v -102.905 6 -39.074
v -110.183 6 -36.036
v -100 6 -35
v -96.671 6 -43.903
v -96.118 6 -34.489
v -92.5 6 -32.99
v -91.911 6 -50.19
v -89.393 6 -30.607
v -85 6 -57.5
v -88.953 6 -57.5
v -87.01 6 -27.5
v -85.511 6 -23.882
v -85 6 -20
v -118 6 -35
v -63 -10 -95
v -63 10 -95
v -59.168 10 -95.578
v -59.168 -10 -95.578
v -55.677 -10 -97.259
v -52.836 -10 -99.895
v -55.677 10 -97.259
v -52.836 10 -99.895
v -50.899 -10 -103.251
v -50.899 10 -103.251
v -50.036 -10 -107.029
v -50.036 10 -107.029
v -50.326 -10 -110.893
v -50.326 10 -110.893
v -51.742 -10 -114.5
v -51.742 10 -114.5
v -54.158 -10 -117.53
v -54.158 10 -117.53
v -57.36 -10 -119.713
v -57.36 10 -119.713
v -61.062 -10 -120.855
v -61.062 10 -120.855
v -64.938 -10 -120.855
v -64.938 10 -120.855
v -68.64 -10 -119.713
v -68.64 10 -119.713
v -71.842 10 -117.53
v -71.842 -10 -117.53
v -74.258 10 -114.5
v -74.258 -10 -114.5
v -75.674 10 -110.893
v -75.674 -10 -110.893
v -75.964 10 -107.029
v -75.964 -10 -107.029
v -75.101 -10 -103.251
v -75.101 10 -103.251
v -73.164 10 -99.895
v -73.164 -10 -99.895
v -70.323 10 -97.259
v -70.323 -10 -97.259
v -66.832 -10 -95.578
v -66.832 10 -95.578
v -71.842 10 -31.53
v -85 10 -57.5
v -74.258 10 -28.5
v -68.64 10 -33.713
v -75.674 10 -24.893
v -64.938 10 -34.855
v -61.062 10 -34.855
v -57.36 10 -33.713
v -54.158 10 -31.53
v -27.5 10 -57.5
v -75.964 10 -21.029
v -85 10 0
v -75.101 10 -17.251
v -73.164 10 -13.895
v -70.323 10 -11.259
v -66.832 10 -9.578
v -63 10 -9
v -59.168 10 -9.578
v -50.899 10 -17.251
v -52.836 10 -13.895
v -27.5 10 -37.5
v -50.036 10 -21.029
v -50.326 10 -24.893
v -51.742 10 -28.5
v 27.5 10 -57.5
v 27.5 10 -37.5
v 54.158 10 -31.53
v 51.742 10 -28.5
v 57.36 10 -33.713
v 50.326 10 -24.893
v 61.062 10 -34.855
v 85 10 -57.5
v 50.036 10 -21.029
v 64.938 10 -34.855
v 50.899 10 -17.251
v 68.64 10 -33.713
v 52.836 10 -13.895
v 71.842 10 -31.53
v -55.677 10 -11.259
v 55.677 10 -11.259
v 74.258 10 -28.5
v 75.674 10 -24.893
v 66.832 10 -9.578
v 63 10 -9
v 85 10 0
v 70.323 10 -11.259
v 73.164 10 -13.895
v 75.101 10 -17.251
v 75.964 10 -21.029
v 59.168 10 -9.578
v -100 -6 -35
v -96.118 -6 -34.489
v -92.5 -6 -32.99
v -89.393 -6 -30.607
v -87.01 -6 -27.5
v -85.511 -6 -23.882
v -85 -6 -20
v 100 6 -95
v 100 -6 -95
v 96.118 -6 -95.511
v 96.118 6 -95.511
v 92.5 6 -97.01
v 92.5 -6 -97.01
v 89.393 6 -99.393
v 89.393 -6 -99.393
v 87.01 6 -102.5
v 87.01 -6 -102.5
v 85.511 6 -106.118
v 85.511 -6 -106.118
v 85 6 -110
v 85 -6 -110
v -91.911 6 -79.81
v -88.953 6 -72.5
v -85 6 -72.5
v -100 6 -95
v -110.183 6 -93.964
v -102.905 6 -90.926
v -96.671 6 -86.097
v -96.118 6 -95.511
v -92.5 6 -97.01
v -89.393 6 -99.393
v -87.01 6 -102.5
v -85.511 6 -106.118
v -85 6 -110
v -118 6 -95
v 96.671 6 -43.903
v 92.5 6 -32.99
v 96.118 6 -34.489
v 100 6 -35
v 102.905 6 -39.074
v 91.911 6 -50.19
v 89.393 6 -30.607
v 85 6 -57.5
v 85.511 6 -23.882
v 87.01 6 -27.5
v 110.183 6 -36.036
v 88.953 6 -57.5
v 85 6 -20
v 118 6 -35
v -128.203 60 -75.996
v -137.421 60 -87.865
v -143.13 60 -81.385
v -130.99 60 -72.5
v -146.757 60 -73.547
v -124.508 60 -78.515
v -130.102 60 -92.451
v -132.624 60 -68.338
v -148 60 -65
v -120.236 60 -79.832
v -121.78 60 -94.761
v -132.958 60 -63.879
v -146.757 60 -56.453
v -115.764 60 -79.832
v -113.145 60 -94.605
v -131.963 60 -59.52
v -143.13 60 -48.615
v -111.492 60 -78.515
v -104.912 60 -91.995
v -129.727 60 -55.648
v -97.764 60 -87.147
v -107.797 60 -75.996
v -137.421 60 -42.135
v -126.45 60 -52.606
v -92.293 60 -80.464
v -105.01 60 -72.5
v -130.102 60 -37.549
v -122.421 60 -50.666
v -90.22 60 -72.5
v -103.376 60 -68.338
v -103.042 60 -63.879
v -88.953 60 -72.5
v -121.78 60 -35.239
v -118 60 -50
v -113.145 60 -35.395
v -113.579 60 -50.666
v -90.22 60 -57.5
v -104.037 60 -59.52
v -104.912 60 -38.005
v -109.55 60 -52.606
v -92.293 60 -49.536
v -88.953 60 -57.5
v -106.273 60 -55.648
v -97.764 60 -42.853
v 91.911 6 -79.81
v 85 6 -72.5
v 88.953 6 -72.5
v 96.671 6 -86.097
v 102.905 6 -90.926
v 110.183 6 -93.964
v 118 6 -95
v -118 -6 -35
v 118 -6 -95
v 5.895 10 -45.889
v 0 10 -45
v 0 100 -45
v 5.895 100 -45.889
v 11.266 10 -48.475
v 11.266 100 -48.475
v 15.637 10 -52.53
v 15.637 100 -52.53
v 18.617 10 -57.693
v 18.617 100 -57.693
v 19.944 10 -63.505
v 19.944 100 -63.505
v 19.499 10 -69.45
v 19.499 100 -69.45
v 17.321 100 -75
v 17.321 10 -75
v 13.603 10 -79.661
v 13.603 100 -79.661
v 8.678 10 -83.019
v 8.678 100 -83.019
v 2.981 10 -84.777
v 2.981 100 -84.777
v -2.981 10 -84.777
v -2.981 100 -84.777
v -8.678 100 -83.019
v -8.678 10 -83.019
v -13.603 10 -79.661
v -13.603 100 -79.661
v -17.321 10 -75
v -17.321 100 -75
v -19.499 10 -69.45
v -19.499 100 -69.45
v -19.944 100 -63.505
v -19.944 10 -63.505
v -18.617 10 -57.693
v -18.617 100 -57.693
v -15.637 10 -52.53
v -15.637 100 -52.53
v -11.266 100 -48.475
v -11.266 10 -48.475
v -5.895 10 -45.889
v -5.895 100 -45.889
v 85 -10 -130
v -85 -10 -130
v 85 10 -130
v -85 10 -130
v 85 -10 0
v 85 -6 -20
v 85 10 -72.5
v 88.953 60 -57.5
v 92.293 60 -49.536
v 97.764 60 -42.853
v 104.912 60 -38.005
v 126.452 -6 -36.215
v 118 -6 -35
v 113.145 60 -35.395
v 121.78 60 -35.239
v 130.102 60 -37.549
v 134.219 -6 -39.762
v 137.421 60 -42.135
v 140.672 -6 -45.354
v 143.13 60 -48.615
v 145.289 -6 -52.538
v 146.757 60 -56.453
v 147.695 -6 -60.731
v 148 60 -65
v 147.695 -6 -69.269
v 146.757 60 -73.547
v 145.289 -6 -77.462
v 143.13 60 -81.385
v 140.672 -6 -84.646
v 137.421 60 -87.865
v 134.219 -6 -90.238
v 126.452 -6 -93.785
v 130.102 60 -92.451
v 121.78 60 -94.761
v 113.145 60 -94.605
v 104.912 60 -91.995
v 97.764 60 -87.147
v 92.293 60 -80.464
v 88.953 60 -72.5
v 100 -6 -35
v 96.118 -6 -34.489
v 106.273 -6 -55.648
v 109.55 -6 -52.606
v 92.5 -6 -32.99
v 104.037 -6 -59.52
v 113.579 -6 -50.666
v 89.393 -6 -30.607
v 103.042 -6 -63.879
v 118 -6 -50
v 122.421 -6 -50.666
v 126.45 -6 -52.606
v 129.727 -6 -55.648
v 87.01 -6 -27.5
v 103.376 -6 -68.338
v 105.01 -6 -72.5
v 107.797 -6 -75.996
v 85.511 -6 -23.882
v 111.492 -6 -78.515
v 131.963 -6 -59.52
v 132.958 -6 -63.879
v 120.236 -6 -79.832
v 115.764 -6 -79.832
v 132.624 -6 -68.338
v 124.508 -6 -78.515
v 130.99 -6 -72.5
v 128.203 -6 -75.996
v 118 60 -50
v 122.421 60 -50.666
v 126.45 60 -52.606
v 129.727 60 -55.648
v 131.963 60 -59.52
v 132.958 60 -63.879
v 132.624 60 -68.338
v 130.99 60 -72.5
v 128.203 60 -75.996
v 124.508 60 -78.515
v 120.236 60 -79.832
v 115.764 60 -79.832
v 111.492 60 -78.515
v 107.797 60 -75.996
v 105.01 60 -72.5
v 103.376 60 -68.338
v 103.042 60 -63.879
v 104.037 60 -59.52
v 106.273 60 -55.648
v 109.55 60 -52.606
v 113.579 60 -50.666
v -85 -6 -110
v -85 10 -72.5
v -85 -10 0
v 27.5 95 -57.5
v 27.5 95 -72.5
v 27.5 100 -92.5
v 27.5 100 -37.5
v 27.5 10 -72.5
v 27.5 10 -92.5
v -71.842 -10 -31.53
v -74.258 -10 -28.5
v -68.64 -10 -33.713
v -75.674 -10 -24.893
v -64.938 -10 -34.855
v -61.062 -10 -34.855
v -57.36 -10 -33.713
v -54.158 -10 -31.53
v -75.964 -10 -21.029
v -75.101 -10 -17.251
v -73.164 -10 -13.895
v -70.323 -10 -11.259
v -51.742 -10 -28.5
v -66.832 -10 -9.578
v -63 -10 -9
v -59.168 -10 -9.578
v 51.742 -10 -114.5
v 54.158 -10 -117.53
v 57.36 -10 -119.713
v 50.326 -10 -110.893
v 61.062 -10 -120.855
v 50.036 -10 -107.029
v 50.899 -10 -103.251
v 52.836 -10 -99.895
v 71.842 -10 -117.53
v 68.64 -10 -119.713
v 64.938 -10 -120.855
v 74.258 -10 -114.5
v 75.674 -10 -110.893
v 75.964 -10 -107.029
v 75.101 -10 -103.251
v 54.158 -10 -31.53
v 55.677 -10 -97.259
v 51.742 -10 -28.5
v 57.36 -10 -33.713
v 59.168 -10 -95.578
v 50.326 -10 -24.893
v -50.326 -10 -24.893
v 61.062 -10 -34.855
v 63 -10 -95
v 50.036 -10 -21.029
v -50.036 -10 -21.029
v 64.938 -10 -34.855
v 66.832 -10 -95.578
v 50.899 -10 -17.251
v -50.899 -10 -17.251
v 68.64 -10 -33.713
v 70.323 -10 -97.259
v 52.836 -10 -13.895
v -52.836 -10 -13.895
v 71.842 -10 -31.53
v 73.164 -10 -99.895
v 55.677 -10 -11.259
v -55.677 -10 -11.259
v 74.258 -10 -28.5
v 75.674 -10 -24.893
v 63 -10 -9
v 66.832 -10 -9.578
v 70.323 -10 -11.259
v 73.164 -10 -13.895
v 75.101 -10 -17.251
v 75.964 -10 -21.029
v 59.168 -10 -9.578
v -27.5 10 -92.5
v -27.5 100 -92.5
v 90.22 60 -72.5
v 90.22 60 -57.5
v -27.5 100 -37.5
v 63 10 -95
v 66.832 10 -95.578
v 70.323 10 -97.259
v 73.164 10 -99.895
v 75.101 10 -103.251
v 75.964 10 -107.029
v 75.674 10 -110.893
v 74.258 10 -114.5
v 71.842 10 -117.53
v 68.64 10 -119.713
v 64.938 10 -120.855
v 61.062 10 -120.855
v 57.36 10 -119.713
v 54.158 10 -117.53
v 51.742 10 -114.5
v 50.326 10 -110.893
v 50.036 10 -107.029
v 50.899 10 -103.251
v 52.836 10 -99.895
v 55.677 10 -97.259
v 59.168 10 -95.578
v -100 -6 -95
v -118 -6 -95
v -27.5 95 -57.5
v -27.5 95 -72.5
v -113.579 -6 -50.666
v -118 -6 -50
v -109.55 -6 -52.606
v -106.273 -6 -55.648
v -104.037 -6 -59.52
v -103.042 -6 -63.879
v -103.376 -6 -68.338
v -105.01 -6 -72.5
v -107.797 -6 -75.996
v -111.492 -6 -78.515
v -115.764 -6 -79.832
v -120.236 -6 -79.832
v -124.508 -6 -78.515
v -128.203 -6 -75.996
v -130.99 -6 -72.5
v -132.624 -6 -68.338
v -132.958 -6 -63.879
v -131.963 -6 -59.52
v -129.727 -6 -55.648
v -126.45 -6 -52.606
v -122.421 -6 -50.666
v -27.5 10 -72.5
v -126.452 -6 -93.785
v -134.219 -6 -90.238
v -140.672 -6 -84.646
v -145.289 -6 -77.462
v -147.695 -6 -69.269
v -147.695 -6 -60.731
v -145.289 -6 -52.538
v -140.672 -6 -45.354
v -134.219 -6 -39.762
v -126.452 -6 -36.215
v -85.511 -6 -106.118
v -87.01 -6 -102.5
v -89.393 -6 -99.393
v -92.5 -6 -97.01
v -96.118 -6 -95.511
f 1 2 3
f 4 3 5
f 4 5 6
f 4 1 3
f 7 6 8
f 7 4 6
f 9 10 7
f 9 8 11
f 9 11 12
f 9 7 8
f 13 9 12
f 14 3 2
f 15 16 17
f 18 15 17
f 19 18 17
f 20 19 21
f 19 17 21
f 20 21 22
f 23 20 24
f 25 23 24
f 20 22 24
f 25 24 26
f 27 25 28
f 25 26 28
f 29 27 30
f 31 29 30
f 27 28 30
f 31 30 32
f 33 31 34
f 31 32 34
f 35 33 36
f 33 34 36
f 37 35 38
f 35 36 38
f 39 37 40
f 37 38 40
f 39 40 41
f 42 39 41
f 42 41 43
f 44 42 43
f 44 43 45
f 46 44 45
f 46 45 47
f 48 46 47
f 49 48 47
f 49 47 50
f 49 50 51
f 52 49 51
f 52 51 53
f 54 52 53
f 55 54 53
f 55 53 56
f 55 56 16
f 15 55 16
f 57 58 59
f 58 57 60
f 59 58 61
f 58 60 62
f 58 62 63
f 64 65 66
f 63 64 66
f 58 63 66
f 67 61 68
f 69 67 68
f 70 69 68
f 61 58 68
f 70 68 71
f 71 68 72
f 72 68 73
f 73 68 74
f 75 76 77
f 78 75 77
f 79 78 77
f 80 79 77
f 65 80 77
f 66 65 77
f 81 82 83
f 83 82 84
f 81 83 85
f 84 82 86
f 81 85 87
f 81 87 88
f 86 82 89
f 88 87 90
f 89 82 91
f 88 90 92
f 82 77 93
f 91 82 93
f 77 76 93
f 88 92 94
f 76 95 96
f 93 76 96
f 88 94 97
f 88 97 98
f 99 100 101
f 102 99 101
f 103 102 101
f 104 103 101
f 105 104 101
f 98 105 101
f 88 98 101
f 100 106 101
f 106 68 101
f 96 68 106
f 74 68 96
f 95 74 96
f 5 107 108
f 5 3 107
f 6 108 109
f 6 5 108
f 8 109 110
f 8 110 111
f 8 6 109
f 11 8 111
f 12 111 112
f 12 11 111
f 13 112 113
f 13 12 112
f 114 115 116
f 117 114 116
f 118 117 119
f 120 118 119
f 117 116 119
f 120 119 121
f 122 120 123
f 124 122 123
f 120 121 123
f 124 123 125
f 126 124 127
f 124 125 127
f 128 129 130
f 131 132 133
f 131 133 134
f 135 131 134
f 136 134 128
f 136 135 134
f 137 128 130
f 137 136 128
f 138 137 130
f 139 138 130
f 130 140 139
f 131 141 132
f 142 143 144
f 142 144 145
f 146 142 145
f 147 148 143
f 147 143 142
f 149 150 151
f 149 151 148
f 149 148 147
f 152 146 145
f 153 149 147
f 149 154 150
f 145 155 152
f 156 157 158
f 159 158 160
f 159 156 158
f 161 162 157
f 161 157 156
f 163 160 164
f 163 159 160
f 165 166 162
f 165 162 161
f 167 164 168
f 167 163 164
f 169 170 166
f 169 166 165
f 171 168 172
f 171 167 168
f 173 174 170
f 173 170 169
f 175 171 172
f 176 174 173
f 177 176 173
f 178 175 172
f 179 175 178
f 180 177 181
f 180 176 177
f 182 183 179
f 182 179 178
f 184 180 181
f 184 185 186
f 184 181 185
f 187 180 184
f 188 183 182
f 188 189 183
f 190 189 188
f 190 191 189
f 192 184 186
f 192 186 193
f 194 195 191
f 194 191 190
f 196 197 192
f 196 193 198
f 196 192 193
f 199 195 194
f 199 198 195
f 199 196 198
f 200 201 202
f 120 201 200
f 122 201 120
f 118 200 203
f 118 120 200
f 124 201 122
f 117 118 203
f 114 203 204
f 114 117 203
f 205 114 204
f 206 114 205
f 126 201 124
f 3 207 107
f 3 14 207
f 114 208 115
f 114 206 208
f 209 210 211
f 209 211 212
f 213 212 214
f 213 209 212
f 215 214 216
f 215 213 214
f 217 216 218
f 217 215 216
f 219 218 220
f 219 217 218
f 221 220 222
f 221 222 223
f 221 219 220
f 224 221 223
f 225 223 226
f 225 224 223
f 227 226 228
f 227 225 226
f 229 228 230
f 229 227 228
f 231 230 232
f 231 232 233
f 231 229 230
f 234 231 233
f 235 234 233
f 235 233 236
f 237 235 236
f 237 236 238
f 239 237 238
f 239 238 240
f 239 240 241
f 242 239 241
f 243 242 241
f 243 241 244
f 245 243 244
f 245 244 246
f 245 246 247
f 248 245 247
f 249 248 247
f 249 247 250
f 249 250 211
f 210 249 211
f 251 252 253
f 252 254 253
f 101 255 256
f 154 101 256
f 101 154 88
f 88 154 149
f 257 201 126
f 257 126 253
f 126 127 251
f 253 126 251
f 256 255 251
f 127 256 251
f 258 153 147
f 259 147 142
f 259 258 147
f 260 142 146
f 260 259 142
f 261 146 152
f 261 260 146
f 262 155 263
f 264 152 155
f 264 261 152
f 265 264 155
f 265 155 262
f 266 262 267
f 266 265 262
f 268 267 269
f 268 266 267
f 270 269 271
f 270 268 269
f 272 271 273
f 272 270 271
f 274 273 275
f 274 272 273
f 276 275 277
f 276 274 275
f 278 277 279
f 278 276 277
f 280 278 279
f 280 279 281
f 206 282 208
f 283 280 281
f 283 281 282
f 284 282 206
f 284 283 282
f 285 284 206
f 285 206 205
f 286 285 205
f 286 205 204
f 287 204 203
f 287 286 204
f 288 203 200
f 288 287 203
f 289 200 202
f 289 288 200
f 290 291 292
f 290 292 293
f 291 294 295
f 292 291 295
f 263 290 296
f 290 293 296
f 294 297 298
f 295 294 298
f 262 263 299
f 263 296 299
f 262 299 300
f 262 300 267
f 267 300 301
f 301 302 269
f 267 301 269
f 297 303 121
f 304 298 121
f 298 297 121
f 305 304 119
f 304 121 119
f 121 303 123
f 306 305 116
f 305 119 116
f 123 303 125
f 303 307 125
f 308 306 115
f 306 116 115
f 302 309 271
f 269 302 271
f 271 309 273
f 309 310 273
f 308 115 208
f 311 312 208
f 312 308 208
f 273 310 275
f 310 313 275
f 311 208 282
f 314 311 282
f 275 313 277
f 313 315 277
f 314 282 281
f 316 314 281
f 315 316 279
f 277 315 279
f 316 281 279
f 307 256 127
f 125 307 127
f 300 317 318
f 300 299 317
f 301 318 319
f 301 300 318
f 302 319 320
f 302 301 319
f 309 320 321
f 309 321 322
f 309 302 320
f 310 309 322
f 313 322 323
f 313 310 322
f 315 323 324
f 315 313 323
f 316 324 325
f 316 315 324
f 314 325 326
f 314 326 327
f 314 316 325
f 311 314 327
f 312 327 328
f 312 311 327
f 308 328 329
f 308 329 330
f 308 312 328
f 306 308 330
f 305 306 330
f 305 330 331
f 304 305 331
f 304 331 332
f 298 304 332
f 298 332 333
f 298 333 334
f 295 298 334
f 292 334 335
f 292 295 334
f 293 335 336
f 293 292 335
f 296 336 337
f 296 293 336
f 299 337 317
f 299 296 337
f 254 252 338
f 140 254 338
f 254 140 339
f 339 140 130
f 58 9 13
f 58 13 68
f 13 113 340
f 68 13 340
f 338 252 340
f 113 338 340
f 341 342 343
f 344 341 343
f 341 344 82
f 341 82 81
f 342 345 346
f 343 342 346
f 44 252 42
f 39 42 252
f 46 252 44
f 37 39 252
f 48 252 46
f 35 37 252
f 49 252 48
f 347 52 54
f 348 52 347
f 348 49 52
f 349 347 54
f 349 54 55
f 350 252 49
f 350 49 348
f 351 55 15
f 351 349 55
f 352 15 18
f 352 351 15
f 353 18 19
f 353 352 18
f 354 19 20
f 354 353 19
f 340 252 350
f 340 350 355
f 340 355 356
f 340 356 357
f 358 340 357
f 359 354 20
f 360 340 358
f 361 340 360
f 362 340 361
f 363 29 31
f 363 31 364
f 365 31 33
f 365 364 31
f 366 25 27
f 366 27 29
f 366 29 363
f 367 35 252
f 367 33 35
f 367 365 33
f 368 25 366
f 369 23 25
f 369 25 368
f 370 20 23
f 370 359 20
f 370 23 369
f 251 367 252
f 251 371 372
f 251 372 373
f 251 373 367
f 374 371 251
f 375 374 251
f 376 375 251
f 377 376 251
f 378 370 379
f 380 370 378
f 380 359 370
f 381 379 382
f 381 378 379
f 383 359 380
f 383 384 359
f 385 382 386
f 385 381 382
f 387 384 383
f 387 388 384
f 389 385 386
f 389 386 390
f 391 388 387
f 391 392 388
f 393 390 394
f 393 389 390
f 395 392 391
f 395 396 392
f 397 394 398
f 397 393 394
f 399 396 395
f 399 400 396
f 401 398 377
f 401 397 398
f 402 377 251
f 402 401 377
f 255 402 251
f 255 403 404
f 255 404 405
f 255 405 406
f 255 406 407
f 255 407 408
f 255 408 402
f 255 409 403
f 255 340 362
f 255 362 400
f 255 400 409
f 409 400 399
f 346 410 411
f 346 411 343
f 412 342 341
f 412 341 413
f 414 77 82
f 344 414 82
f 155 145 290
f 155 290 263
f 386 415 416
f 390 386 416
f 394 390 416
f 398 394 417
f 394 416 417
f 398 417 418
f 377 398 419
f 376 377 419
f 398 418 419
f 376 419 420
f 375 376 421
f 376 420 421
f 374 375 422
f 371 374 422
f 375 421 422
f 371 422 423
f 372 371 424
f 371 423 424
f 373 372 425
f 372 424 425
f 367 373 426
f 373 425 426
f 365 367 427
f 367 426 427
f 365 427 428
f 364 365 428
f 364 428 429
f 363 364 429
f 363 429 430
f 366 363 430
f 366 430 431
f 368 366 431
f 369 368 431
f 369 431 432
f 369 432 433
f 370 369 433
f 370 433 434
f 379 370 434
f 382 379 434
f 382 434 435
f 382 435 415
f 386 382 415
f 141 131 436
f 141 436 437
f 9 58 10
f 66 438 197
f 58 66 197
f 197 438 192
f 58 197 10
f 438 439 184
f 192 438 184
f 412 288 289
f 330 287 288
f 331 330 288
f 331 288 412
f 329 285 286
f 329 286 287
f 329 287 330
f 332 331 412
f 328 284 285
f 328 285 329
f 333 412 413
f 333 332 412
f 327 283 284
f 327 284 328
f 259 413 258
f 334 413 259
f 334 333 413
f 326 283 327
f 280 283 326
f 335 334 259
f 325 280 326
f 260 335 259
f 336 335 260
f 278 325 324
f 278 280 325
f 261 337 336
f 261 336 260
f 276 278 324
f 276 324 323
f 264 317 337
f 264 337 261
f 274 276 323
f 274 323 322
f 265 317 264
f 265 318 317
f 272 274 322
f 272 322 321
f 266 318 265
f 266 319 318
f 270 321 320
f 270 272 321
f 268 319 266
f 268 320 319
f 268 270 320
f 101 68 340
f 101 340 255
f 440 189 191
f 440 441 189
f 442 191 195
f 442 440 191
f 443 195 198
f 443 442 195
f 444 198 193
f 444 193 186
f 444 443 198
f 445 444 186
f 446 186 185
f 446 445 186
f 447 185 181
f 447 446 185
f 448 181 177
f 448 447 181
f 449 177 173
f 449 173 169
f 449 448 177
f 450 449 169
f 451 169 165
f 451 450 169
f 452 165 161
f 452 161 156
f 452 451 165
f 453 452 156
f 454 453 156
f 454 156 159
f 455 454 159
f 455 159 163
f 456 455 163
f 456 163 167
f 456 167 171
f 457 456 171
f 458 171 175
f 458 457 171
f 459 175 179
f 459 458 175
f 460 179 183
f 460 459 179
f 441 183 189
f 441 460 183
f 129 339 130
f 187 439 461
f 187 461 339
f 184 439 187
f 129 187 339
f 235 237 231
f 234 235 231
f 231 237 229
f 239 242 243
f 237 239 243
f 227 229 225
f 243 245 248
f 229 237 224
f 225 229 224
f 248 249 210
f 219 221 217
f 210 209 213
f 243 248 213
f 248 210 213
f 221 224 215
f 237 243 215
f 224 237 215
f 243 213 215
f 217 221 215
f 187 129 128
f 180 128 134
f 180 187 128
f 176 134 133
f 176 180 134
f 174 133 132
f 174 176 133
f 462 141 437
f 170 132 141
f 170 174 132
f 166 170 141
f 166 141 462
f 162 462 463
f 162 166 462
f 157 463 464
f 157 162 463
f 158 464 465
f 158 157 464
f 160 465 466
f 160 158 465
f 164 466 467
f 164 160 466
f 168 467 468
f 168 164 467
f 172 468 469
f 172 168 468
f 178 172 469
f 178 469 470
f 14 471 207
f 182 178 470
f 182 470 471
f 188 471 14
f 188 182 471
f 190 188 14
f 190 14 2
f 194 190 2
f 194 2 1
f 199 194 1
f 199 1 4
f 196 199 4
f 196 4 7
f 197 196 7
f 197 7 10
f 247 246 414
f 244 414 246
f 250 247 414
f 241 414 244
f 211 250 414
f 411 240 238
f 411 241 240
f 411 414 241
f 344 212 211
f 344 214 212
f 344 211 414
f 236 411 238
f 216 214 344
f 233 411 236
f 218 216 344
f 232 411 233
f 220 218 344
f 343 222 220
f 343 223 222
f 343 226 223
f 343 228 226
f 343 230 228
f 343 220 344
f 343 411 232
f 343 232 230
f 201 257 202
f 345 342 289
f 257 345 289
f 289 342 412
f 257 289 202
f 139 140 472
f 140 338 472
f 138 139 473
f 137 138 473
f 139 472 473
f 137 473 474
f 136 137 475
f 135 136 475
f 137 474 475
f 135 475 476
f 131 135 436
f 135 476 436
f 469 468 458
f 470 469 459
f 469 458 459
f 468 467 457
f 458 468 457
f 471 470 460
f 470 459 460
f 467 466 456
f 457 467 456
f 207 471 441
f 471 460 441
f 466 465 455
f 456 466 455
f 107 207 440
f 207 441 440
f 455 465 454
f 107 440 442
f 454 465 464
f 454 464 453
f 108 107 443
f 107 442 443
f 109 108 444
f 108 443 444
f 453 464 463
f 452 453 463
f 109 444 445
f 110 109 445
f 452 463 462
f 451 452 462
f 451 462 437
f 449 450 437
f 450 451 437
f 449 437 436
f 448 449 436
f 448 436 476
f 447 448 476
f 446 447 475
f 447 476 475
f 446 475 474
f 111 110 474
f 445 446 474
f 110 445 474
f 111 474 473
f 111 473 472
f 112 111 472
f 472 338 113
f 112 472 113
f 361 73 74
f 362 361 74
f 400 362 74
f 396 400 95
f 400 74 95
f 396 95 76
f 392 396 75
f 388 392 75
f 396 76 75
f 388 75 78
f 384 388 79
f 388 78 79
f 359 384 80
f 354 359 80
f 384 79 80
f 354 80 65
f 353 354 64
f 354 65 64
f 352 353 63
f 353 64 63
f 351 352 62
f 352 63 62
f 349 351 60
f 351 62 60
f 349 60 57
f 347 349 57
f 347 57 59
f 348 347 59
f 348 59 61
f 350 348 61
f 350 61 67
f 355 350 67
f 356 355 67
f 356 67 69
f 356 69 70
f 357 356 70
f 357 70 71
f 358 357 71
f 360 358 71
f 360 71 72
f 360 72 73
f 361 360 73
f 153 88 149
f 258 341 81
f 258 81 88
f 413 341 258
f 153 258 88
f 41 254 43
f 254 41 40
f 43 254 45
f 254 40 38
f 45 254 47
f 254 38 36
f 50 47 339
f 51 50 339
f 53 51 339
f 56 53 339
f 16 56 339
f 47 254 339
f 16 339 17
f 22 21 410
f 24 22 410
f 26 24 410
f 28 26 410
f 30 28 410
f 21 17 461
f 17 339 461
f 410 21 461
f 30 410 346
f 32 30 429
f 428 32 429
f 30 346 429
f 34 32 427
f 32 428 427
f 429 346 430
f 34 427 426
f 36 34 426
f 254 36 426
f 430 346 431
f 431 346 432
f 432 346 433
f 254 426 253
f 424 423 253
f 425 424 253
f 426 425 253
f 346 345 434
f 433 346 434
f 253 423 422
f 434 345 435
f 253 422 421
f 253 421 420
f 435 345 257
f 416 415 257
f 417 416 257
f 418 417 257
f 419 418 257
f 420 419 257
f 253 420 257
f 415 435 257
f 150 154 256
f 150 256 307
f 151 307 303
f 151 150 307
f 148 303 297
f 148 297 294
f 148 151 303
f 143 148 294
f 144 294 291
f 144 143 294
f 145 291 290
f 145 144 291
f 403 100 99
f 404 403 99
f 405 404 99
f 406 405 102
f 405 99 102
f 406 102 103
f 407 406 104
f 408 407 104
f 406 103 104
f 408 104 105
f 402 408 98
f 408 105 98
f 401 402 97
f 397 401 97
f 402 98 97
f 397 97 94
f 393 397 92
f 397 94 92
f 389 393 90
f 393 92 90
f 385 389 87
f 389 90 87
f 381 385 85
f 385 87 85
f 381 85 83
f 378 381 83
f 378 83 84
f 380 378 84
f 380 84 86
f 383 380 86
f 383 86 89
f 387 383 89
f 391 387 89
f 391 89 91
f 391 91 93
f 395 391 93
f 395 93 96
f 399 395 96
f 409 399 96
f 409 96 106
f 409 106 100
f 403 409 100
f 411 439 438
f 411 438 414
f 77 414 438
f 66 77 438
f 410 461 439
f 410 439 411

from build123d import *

# Parameters (mm, degrees)
SKETCH1_W                  = 170
SKETCH1_H                  = 20
BOSS_EXTRUDE1_DEPTH        = 130
BOSS_EXTRUDE3_DEPTH        = 60
BOSS_EXTRUDE3_DEPTH_BACK   = 6
SKETCH2_R                  = 30
SKETCH2_R_2                = 15
BOSS_EXTRUDE3_2_DEPTH      = 60
BOSS_EXTRUDE3_2_DEPTH_BACK = 6
BOSS_EXTRUDE4_DEPTH        = 6
BOSS_EXTRUDE4_DEPTH_BACK   = 6
SKETCH2_4_W                = 55
SKETCH2_4_H                = 55
SKETCH2_5_W                = 55
SKETCH2_5_H                = 55
SKETCH2_5_R                = 20
BOSS_EXTRUDE5_DEPTH        = 100
RIB10_REACH                = 192.076
SKETCH3_WALL_W             = 453.9773952
SKETCH3_WALL_H             = 15
SKETCH4_R                  = 13
CUT_EXTRUDE1_DEPTH         = 217.573313222


with BuildPart() as part:
    # Sketch1 → Boss-Extrude1 (new body)
    with BuildSketch(Plane.XY):
        Rectangle(SKETCH1_W, SKETCH1_H)
    extrude(amount=-BOSS_EXTRUDE1_DEPTH)



with BuildPart() as body_2:
    # Sketch2 → Boss-Extrude3 (new, two sides: drawn at the far end of the back side and taken through both)
    with BuildSketch(Plane(origin=(0, 0, 0), x_dir=(1, 0, 0), z_dir=(0, 1, 0)).offset(-BOSS_EXTRUDE3_DEPTH_BACK)):
        with Locations((-118, 65)):
            Circle(SKETCH2_R)
        with Locations((-118, 65)):
            Circle(SKETCH2_R_2, mode=Mode.SUBTRACT)
    extrude(amount=BOSS_EXTRUDE3_DEPTH + BOSS_EXTRUDE3_DEPTH_BACK)


with BuildPart() as body_3:
    # Sketch2 → Boss-Extrude3 2 (new, two sides: drawn at the far end of the back side and taken through both)
    with BuildSketch(Plane(origin=(0, 0, 0), x_dir=(1, 0, 0), z_dir=(0, 1, 0)).offset(-BOSS_EXTRUDE3_2_DEPTH_BACK)):
        with Locations((118, 65)):
            Circle(SKETCH2_R)
        with Locations((118, 65)):
            Circle(SKETCH2_R_2, mode=Mode.SUBTRACT)
    extrude(amount=BOSS_EXTRUDE3_2_DEPTH + BOSS_EXTRUDE3_2_DEPTH_BACK)


with BuildPart() as part_1:
    add(part.part)

    add(body_2.part)  # Boss-Extrude4 merges body 2

    add(body_3.part)  # Boss-Extrude4 merges body 3
    # Sketch2<4> → Boss-Extrude4 (add, two sides: drawn at the far end of the back side and taken through both)
    with BuildSketch(Plane(origin=(0, 0, 0), x_dir=(1, 0, 0), z_dir=(0, 1, 0)).offset(-BOSS_EXTRUDE4_DEPTH_BACK)):
        with BuildLine():
            Line((85, 130), (-85, 130))
            Line((-85, 130), (-85, 110))
            ThreePointArc((-85, 110), (-89.393398282, 99.393398282), (-100, 95))
            Line((-100, 95), (-118, 95))
            ThreePointArc((-118, 95), (-96.786796564, 86.213203436), (-88, 65))
            ThreePointArc((-88, 65), (-96.786796564, 43.786796564), (-118, 35))
            Line((-118, 35), (-100, 35))
            ThreePointArc((-100, 35), (-89.393398282, 30.606601718), (-85, 20))
            Line((-85, 20), (-85, 0))
            Line((-85, 0), (85, 0))
            Line((85, 0), (85, 20))
            ThreePointArc((85, 20), (89.393398282, 30.606601718), (100, 35))
            Line((100, 35), (118, 35))
            ThreePointArc((118, 35), (88, 65), (118, 95))
            Line((118, 95), (100, 95))
            ThreePointArc((100, 95), (89.393398282, 99.393398282), (85, 110))
            Line((85, 110), (85, 130))
        make_face()
        with Locations((0, 65)):
            Rectangle(SKETCH2_4_W, SKETCH2_4_H, mode=Mode.SUBTRACT)
    extrude(amount=BOSS_EXTRUDE4_DEPTH + BOSS_EXTRUDE4_DEPTH_BACK)

    # Sketch2<5> → Boss-Extrude5 (add)
    with BuildSketch(Plane(origin=(0, 0, 0), x_dir=(1, 0, 0), z_dir=(0, 1, 0))):
        with Locations((0, 65)):
            Rectangle(SKETCH2_5_W, SKETCH2_5_H)
        with Locations((0, 65)):
            Circle(SKETCH2_5_R, mode=Mode.SUBTRACT)
    extrude(amount=BOSS_EXTRUDE5_DEPTH)

    # Sketch3 wall → Rib10 (add, up to next)
    with BuildSketch(Plane(origin=(-58.860010645, 77.5, -65), x_dir=(-0.873236351537, -0.487296905752, 0), z_dir=(0.487296905752, -0.873236351537, 0)), mode=Mode.PRIVATE) as rib10_sk1:
        Rectangle(SKETCH3_WALL_W, SKETCH3_WALL_H)
    rib10_tool1 = extrude(rib10_sk1.sketch, amount=RIB10_REACH, mode=Mode.PRIVATE) - part_1.part
    rib10 = rib10_tool1.solids().sort_by_distance((-58.860010645, 77.5, -65))[0]
    add(rib10)

    # Mirror1: Rib10 across plane
    add(rib10.mirror(Plane(origin=(0, 0, 0), x_dir=(0, 0, 1), z_dir=(1, 0, 0))))

    # Sketch4 → Cut-Extrude1 (cut, through all)
    with BuildSketch(Plane(origin=(0, 10, 0), x_dir=(1, 0, 0), z_dir=(0, 1, 0))):
        with Locations((-63, 108)):
            Circle(SKETCH4_R)
        with Locations((63, 108)):
            Circle(SKETCH4_R)
        with Locations((-63, 22)):
            Circle(SKETCH4_R)
        with Locations((63, 22)):
            Circle(SKETCH4_R)
    extrude(amount=-CUT_EXTRUDE1_DEPTH, mode=Mode.SUBTRACT)


solid = part_1.part
